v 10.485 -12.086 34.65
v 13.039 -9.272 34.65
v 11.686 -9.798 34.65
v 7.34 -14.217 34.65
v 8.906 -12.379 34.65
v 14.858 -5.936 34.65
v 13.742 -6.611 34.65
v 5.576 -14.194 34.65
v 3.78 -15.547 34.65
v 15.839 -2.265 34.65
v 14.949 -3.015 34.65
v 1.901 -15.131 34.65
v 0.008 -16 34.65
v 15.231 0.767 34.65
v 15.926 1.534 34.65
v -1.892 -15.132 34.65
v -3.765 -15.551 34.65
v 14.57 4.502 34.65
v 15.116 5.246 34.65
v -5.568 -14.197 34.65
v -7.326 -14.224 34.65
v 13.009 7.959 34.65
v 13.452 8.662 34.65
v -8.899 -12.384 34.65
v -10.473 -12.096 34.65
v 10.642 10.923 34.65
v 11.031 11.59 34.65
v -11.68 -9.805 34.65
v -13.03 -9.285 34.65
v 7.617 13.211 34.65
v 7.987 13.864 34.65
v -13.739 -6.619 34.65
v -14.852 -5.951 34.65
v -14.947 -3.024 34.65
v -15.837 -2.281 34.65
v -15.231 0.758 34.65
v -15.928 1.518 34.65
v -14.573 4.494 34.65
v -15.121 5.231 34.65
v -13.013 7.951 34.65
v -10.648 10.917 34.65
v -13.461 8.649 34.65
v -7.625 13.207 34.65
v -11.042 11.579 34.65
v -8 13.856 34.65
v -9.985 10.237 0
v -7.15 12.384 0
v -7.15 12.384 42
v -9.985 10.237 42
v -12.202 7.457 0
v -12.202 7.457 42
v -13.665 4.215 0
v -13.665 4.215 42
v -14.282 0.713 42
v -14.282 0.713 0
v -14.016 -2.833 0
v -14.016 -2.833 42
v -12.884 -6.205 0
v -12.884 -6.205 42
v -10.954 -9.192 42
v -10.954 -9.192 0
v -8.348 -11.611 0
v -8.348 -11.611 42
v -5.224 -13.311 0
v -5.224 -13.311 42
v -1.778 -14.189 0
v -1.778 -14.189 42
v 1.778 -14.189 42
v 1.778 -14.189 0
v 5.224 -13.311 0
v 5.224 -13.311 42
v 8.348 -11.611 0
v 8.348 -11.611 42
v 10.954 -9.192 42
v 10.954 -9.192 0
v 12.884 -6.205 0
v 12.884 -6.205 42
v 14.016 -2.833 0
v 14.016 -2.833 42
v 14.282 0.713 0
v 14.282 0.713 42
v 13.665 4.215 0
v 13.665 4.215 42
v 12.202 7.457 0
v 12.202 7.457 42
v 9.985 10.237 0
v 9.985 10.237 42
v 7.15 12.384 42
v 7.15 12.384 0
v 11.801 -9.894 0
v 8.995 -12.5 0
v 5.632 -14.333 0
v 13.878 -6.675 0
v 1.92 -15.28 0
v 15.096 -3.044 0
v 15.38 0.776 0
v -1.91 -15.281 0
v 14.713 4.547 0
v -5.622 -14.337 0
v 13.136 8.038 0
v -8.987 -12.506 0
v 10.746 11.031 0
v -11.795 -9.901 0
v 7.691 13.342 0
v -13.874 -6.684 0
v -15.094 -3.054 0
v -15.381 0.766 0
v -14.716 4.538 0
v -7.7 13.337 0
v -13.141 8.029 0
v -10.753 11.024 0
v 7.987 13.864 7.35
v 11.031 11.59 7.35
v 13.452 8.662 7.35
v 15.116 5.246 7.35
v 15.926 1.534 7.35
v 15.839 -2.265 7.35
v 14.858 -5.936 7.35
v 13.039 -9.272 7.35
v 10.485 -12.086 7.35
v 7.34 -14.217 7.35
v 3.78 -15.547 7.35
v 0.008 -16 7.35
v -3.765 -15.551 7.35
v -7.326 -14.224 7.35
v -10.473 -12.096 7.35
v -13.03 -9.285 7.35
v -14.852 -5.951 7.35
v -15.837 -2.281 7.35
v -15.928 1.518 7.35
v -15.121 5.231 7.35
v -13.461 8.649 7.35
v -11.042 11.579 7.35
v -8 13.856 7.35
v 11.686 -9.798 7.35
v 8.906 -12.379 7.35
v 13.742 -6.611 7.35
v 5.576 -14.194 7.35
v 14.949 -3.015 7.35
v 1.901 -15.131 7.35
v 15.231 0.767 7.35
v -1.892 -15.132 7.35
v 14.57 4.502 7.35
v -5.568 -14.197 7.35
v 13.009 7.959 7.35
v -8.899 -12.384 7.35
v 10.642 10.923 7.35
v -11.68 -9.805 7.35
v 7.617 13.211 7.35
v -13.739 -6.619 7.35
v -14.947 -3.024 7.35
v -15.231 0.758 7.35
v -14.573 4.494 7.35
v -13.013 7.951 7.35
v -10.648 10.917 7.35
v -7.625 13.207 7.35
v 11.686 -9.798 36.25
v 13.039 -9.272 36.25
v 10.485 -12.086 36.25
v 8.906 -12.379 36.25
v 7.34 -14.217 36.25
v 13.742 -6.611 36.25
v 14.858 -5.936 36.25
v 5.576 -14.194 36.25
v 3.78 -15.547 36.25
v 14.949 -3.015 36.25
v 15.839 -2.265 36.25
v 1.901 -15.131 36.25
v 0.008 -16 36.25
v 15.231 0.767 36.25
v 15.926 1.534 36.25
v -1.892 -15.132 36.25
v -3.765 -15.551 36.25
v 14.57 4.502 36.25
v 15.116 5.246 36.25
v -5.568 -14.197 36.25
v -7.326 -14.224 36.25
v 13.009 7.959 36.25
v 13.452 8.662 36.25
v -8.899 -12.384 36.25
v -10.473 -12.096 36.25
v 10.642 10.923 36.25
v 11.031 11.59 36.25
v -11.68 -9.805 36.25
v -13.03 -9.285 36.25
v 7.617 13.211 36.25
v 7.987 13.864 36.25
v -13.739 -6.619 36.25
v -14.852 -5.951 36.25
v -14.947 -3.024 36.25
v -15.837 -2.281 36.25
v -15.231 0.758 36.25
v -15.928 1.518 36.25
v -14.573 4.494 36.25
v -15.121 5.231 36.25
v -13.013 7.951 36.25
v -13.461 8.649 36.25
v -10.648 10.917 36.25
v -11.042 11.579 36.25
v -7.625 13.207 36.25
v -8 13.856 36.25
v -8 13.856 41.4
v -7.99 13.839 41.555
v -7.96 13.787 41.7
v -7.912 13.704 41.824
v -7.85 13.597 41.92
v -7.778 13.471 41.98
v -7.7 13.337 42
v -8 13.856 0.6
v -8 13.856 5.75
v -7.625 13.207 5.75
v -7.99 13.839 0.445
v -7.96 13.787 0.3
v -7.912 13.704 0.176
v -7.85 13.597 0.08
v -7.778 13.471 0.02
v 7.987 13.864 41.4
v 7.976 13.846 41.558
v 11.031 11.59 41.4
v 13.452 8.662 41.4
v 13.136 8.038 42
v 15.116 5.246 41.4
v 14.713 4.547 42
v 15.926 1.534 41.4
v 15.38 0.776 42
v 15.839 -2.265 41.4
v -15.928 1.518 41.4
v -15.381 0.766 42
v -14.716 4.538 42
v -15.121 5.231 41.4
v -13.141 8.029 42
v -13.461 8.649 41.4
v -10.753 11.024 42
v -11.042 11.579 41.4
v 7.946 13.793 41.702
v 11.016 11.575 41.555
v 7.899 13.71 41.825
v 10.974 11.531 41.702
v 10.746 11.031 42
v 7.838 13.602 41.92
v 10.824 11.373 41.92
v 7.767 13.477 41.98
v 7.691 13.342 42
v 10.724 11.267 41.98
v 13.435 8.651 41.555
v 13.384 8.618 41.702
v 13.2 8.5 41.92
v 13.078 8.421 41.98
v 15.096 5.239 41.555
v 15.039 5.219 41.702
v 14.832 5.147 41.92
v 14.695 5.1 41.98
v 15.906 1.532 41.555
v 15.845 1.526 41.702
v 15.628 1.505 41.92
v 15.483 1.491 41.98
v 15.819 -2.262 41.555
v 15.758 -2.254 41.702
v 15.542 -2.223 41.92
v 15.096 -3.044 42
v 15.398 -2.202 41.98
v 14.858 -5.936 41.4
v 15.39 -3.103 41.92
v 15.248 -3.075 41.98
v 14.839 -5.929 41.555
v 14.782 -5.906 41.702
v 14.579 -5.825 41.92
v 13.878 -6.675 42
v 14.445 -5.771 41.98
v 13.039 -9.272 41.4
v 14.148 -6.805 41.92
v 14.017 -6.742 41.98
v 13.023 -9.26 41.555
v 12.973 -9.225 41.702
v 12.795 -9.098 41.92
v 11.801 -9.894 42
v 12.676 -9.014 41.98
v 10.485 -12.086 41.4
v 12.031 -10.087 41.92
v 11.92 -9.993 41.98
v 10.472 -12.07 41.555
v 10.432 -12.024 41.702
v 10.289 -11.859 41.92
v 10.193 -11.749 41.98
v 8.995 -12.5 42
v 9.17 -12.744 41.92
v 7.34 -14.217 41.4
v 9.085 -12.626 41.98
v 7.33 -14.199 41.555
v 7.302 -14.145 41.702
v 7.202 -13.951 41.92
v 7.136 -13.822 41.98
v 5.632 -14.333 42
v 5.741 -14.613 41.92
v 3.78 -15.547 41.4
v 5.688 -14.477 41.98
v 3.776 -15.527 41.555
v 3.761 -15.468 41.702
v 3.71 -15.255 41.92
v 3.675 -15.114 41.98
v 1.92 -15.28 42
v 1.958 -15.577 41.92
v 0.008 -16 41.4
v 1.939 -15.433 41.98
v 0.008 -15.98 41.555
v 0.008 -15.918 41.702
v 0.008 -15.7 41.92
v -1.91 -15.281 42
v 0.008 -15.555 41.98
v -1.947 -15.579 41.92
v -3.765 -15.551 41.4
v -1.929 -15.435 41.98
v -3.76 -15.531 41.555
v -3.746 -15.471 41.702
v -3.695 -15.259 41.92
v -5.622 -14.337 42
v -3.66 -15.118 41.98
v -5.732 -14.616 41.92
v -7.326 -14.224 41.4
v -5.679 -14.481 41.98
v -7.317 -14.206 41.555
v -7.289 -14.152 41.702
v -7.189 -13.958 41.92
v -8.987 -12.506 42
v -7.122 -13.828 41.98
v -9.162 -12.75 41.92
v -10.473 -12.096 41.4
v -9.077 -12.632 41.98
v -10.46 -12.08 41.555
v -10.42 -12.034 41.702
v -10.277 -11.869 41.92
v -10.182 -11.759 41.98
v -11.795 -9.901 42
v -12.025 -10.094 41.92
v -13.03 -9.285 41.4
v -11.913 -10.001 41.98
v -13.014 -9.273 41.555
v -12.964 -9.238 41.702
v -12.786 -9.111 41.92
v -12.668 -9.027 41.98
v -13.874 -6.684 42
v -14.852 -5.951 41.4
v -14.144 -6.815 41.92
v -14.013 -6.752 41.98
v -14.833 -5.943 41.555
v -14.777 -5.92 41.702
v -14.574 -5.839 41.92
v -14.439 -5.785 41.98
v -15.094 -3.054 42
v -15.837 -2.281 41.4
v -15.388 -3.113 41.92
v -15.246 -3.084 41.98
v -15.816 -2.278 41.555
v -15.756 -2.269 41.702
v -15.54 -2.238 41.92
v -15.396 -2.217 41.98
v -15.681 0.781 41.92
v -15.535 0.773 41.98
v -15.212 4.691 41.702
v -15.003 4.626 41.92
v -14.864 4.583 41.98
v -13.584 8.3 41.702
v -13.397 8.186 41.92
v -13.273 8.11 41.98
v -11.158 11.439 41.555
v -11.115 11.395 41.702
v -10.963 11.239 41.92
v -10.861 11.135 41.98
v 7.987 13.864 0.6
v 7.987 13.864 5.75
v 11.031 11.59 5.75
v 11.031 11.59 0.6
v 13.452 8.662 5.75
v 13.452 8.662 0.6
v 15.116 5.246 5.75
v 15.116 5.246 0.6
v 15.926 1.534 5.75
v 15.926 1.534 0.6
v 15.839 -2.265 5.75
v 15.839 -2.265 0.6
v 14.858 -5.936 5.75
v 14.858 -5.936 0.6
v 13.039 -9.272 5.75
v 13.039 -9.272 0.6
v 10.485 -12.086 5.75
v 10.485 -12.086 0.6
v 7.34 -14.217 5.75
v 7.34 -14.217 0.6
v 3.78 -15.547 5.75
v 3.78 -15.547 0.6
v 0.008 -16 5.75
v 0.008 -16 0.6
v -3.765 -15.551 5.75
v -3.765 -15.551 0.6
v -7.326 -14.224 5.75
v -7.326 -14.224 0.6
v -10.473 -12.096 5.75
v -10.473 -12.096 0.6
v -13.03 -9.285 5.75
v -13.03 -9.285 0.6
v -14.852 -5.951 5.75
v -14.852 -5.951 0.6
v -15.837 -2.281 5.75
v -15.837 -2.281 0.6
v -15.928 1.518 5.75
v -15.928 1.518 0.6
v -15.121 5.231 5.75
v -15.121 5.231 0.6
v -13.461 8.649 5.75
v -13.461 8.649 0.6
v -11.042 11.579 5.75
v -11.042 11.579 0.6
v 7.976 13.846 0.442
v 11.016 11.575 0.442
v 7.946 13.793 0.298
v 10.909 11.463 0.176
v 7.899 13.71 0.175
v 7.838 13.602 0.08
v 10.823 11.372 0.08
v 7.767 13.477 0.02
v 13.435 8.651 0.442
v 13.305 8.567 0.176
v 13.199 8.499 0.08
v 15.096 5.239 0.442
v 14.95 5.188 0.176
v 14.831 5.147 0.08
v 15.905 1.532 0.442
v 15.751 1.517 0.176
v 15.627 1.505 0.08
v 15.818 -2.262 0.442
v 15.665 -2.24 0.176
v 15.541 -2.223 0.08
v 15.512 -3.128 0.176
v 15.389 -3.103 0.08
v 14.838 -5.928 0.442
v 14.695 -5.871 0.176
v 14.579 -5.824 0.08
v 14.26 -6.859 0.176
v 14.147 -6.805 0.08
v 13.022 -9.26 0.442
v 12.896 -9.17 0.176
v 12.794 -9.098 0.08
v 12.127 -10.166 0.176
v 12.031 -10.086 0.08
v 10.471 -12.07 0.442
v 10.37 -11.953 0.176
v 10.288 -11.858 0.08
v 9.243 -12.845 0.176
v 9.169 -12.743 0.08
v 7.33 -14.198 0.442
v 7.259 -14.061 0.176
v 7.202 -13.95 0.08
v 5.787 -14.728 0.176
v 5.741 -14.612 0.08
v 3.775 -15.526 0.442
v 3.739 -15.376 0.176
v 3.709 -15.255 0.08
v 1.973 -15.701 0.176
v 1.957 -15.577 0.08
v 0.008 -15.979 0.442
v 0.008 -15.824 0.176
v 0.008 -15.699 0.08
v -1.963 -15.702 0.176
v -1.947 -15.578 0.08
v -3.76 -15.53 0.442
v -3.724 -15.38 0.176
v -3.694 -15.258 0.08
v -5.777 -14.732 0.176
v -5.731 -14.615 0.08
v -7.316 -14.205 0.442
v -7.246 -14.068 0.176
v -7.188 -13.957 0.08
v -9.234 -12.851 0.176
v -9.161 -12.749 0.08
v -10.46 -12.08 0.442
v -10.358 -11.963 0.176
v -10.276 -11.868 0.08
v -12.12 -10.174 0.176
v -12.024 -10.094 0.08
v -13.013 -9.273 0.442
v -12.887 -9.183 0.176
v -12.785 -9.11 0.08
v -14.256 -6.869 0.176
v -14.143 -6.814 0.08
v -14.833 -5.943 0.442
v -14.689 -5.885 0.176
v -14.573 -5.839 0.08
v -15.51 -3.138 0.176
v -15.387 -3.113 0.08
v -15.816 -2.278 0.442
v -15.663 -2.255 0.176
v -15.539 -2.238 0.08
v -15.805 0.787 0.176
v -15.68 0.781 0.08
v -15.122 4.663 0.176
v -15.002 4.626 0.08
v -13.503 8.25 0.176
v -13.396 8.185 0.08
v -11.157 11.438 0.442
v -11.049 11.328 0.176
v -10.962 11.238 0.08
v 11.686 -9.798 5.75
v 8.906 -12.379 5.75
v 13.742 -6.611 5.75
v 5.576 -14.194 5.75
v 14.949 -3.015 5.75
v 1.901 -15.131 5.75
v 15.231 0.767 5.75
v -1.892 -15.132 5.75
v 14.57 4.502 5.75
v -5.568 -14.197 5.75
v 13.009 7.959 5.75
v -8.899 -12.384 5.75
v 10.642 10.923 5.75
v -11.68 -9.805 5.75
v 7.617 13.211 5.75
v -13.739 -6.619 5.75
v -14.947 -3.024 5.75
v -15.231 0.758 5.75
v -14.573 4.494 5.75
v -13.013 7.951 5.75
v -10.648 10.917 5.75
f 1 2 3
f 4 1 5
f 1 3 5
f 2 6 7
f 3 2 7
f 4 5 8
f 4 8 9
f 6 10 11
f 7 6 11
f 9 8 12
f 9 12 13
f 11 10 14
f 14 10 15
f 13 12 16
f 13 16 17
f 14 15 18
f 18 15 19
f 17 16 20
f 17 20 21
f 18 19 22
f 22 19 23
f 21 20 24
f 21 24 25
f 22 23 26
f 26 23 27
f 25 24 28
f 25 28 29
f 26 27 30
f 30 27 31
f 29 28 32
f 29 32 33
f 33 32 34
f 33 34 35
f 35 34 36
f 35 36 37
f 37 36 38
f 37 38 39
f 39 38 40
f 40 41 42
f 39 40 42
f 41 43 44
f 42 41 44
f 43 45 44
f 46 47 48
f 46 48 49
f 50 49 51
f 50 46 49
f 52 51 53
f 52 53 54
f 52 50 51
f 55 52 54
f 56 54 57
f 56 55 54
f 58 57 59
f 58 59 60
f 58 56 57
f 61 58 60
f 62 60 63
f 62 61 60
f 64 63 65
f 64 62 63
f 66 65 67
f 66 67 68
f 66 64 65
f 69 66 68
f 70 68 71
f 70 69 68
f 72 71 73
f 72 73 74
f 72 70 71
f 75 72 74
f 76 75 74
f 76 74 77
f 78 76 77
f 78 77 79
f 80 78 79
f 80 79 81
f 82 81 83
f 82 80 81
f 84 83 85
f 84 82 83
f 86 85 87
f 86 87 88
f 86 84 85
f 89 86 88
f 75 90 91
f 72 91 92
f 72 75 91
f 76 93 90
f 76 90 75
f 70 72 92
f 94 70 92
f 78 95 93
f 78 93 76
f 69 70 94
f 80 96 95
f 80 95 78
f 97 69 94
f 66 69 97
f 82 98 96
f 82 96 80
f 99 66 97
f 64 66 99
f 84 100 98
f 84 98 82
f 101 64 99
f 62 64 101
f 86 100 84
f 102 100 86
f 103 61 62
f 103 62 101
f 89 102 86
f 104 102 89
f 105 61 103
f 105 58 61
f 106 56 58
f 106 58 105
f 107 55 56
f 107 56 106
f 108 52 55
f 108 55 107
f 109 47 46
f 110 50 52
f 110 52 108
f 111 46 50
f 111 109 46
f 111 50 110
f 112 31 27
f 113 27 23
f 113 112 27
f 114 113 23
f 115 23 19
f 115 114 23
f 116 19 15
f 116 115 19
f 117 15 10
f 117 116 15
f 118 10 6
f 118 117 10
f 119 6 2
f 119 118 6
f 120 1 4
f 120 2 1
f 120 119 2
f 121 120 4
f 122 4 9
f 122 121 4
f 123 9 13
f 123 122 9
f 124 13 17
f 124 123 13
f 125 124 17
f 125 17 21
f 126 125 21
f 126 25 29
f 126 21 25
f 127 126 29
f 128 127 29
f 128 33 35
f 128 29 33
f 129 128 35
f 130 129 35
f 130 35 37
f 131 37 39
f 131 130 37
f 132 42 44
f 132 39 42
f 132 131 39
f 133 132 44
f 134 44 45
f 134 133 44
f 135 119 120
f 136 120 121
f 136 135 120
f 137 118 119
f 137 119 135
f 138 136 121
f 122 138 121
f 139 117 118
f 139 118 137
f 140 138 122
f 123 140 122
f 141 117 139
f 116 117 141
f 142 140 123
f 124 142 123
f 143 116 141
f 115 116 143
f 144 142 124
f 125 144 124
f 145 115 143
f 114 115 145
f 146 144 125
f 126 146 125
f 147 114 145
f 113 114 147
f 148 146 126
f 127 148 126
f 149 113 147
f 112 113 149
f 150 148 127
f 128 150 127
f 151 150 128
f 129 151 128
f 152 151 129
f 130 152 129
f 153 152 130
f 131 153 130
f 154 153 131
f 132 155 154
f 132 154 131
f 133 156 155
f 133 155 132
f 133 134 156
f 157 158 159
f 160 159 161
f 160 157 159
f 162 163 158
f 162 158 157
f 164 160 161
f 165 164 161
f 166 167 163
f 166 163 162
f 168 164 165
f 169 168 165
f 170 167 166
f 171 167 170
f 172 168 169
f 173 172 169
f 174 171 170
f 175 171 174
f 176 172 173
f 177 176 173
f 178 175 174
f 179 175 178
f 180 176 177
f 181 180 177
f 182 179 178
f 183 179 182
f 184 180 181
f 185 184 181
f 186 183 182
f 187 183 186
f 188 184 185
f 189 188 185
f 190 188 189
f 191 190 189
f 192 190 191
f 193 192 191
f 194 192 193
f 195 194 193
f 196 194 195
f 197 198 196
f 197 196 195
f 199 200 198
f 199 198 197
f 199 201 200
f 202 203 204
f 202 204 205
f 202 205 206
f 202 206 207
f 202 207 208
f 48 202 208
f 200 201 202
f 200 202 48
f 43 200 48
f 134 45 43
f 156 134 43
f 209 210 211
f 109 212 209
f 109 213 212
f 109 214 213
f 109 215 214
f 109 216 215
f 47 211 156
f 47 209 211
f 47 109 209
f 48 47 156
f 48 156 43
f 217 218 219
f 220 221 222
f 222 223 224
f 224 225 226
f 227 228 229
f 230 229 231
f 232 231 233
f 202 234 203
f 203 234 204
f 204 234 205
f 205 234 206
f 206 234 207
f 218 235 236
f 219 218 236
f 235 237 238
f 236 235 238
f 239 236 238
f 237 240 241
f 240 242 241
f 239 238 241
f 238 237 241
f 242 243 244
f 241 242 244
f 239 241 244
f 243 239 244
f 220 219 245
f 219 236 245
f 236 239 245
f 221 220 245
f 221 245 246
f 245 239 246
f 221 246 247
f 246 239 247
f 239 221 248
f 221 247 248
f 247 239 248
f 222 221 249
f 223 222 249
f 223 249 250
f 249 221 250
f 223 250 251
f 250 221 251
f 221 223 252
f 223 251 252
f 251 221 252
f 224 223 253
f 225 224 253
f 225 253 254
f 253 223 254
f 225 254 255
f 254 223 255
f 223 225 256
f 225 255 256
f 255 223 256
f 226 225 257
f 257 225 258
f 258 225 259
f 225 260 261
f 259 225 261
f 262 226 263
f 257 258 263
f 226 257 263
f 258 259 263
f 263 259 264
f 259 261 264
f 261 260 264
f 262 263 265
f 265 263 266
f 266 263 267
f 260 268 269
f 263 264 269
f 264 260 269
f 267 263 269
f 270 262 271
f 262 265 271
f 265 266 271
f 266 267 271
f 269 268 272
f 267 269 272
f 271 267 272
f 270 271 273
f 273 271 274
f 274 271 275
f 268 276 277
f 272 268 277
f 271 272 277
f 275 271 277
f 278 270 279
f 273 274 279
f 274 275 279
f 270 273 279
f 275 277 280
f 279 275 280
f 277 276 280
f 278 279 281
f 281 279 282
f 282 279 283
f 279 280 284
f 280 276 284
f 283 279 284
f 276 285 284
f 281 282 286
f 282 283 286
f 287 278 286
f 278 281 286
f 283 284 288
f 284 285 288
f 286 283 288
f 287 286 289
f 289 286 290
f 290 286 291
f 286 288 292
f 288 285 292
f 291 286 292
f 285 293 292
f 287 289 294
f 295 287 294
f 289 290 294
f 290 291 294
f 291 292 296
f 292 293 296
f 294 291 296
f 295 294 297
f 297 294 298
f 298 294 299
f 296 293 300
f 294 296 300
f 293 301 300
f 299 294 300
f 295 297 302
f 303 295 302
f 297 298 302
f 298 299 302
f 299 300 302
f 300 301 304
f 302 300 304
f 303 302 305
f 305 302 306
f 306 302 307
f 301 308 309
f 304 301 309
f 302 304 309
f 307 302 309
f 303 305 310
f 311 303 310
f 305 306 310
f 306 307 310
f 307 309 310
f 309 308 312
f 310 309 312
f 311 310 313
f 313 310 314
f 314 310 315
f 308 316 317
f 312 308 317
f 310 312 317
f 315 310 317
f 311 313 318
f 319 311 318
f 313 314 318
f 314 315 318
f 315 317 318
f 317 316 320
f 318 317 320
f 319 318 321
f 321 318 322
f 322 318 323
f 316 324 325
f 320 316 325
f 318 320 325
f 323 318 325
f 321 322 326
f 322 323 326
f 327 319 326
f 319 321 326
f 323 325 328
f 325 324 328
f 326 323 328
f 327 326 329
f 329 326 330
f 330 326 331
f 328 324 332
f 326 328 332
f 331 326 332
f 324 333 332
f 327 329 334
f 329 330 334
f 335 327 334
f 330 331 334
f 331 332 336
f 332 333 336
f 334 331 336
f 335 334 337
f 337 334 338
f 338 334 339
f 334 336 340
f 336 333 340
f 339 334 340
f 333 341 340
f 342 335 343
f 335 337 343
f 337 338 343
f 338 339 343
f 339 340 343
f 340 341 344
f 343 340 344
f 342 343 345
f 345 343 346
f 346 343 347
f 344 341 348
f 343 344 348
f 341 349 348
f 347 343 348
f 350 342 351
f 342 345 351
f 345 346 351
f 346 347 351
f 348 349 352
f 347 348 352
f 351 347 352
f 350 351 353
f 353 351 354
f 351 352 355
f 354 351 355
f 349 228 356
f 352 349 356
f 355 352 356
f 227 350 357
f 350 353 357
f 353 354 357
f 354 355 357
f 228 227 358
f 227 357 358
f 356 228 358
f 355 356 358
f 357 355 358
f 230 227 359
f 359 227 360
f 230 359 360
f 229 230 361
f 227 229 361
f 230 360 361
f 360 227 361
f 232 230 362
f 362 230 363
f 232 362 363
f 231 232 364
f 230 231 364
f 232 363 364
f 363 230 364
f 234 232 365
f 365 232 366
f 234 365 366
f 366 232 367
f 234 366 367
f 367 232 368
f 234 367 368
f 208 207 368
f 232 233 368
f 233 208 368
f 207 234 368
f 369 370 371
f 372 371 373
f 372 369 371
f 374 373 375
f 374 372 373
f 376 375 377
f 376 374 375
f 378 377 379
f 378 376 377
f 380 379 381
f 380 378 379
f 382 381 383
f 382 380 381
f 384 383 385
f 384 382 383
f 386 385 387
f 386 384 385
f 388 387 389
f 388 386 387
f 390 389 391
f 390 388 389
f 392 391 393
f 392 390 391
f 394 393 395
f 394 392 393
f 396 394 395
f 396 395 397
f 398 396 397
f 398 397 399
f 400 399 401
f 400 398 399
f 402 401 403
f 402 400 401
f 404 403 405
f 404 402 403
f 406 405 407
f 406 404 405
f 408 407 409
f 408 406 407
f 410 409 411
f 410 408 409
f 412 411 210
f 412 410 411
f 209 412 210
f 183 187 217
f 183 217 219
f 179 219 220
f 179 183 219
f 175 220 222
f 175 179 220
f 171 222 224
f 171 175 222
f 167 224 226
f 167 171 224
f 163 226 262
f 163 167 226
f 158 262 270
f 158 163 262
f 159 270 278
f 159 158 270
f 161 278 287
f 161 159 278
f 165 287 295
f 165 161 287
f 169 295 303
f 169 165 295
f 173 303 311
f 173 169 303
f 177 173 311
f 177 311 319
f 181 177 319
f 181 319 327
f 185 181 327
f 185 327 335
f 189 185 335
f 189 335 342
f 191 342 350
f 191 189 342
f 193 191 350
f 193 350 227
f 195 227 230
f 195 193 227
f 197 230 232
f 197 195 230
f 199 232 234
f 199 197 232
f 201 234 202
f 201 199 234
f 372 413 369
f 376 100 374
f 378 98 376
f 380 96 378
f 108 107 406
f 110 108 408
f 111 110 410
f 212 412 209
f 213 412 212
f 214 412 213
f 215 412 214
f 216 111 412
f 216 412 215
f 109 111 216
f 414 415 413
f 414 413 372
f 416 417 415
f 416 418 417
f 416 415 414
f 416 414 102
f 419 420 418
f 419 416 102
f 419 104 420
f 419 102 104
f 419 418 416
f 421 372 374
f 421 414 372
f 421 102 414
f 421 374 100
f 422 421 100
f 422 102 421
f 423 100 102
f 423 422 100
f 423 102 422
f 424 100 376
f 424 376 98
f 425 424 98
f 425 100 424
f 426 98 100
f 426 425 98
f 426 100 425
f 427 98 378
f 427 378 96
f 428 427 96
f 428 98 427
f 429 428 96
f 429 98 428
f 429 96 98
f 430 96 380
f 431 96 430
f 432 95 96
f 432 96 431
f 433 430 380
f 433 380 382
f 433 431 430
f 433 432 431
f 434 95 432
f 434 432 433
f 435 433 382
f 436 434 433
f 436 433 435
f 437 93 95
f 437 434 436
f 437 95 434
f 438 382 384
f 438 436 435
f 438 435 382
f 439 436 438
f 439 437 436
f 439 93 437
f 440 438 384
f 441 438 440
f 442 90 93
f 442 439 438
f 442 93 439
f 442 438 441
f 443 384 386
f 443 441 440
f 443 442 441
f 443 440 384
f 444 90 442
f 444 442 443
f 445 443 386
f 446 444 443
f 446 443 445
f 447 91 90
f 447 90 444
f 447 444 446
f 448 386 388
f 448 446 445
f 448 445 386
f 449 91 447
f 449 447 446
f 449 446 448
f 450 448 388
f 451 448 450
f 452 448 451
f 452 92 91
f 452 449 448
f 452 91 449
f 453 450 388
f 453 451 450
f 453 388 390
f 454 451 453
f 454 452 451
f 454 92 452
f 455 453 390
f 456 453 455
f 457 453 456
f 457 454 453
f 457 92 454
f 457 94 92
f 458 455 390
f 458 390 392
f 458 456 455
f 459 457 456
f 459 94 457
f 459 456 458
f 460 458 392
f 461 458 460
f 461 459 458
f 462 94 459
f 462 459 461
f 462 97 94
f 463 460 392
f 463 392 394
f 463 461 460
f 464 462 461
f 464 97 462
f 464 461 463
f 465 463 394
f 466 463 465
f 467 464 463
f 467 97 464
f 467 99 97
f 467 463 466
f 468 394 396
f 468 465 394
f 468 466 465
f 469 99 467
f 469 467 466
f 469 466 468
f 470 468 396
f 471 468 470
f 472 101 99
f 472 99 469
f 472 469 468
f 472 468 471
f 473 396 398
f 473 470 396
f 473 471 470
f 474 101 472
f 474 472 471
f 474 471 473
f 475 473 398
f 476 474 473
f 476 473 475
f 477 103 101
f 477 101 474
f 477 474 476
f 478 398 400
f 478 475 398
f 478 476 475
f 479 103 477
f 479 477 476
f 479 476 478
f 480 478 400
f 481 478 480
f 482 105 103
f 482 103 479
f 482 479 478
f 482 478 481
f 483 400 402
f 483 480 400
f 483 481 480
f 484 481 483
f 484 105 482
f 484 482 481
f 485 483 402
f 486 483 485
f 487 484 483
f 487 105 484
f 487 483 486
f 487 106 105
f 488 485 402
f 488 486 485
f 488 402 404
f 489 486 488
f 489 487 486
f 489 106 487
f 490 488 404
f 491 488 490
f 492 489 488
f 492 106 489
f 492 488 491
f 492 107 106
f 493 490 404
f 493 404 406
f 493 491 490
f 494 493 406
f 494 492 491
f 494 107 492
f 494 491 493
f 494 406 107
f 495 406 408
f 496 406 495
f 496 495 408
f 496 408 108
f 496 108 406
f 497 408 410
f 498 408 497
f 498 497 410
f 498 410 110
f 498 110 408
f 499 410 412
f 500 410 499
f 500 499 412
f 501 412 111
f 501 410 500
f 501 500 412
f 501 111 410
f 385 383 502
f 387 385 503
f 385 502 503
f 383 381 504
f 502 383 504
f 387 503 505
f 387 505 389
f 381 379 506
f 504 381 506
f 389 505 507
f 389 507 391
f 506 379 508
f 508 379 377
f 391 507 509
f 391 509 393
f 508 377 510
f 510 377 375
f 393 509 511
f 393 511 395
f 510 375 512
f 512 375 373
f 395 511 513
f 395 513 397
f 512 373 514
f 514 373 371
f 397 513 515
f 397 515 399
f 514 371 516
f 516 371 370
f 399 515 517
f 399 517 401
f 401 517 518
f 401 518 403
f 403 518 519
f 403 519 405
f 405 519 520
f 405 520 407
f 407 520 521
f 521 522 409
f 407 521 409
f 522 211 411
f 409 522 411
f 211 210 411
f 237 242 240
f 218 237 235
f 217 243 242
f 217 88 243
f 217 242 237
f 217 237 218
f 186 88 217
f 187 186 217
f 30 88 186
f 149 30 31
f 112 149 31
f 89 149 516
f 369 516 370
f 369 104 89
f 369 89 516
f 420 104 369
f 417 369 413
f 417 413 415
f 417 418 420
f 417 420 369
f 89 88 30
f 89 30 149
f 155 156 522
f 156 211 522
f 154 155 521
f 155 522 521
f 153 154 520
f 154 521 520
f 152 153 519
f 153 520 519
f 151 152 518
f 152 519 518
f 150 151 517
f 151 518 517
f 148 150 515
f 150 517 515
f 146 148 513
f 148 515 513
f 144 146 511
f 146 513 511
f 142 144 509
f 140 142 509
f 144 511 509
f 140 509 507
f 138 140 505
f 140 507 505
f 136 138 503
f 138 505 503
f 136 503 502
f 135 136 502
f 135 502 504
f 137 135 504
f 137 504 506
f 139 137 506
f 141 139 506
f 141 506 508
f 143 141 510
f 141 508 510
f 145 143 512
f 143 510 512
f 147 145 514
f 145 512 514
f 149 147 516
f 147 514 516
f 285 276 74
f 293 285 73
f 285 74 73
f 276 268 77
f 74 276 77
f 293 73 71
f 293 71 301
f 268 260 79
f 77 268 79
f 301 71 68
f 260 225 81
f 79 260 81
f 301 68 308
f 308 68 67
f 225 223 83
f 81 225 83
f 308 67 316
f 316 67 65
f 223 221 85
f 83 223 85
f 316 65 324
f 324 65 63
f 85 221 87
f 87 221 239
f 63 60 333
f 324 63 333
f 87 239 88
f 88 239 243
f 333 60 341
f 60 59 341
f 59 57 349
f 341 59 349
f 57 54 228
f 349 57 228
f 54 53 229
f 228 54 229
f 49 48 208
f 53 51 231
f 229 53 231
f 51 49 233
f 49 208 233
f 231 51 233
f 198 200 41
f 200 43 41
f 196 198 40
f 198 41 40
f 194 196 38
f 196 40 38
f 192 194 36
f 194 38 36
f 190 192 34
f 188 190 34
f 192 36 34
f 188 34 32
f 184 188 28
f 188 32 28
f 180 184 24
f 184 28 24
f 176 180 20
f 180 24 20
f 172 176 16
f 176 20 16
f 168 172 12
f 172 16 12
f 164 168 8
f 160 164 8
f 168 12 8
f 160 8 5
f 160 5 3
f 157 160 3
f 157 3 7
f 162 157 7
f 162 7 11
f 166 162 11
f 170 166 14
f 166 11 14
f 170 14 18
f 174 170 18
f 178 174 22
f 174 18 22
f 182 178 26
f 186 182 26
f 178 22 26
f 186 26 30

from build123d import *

# Parameters (mm, degrees)
BOSS_EXTRUDE1_DEPTH = 42
SKETCH2_W           = 0.75
SKETCH2_H           = 1.6
FILLET1_R           = 0.6


with BuildPart() as part:
    # Sketch1 → Boss-Extrude1 (new body)
    with BuildSketch(Plane.XY):
        with BuildLine():
            Line((-8, 13.856406461), (-7.15, 12.384163274))
            ThreePointArc((-7.15, 12.384163274), (0, -14.3), (7.15, 12.384163274))
            Line((7.15, 12.384163274), (7.986524529, 13.864177795))
            ThreePointArc((7.986524529, 13.864177795), (0.007777885, -15.99999811), (-8, 13.856406461))
        make_face()
    extrude(amount=BOSS_EXTRUDE1_DEPTH)

    # Sketch2 → Cut-Revolve1 (revolve, cut)
    with BuildSketch(Plane(origin=(0, 0, 0), x_dir=(1, 0, 0), z_dir=(0, 1, 0))):
        with Locations((15.625, -35.45)):
            Rectangle(SKETCH2_W, SKETCH2_H)
        with Locations((15.625, -6.55)):
            Rectangle(SKETCH2_W, SKETCH2_H)
    revolve(axis=Axis((0, 0, 0), (0, 0, 1)), mode=Mode.SUBTRACT)

    # Fillet1
    fillet1_edges = [part.edges().sort_by_distance(p)[0] for p in [
        (0.007777885, -15.99999811, 42),
        (0.007777885, -15.99999811, 0),
    ]]
    fillet(fillet1_edges, radius=FILLET1_R)


solid = part.part
